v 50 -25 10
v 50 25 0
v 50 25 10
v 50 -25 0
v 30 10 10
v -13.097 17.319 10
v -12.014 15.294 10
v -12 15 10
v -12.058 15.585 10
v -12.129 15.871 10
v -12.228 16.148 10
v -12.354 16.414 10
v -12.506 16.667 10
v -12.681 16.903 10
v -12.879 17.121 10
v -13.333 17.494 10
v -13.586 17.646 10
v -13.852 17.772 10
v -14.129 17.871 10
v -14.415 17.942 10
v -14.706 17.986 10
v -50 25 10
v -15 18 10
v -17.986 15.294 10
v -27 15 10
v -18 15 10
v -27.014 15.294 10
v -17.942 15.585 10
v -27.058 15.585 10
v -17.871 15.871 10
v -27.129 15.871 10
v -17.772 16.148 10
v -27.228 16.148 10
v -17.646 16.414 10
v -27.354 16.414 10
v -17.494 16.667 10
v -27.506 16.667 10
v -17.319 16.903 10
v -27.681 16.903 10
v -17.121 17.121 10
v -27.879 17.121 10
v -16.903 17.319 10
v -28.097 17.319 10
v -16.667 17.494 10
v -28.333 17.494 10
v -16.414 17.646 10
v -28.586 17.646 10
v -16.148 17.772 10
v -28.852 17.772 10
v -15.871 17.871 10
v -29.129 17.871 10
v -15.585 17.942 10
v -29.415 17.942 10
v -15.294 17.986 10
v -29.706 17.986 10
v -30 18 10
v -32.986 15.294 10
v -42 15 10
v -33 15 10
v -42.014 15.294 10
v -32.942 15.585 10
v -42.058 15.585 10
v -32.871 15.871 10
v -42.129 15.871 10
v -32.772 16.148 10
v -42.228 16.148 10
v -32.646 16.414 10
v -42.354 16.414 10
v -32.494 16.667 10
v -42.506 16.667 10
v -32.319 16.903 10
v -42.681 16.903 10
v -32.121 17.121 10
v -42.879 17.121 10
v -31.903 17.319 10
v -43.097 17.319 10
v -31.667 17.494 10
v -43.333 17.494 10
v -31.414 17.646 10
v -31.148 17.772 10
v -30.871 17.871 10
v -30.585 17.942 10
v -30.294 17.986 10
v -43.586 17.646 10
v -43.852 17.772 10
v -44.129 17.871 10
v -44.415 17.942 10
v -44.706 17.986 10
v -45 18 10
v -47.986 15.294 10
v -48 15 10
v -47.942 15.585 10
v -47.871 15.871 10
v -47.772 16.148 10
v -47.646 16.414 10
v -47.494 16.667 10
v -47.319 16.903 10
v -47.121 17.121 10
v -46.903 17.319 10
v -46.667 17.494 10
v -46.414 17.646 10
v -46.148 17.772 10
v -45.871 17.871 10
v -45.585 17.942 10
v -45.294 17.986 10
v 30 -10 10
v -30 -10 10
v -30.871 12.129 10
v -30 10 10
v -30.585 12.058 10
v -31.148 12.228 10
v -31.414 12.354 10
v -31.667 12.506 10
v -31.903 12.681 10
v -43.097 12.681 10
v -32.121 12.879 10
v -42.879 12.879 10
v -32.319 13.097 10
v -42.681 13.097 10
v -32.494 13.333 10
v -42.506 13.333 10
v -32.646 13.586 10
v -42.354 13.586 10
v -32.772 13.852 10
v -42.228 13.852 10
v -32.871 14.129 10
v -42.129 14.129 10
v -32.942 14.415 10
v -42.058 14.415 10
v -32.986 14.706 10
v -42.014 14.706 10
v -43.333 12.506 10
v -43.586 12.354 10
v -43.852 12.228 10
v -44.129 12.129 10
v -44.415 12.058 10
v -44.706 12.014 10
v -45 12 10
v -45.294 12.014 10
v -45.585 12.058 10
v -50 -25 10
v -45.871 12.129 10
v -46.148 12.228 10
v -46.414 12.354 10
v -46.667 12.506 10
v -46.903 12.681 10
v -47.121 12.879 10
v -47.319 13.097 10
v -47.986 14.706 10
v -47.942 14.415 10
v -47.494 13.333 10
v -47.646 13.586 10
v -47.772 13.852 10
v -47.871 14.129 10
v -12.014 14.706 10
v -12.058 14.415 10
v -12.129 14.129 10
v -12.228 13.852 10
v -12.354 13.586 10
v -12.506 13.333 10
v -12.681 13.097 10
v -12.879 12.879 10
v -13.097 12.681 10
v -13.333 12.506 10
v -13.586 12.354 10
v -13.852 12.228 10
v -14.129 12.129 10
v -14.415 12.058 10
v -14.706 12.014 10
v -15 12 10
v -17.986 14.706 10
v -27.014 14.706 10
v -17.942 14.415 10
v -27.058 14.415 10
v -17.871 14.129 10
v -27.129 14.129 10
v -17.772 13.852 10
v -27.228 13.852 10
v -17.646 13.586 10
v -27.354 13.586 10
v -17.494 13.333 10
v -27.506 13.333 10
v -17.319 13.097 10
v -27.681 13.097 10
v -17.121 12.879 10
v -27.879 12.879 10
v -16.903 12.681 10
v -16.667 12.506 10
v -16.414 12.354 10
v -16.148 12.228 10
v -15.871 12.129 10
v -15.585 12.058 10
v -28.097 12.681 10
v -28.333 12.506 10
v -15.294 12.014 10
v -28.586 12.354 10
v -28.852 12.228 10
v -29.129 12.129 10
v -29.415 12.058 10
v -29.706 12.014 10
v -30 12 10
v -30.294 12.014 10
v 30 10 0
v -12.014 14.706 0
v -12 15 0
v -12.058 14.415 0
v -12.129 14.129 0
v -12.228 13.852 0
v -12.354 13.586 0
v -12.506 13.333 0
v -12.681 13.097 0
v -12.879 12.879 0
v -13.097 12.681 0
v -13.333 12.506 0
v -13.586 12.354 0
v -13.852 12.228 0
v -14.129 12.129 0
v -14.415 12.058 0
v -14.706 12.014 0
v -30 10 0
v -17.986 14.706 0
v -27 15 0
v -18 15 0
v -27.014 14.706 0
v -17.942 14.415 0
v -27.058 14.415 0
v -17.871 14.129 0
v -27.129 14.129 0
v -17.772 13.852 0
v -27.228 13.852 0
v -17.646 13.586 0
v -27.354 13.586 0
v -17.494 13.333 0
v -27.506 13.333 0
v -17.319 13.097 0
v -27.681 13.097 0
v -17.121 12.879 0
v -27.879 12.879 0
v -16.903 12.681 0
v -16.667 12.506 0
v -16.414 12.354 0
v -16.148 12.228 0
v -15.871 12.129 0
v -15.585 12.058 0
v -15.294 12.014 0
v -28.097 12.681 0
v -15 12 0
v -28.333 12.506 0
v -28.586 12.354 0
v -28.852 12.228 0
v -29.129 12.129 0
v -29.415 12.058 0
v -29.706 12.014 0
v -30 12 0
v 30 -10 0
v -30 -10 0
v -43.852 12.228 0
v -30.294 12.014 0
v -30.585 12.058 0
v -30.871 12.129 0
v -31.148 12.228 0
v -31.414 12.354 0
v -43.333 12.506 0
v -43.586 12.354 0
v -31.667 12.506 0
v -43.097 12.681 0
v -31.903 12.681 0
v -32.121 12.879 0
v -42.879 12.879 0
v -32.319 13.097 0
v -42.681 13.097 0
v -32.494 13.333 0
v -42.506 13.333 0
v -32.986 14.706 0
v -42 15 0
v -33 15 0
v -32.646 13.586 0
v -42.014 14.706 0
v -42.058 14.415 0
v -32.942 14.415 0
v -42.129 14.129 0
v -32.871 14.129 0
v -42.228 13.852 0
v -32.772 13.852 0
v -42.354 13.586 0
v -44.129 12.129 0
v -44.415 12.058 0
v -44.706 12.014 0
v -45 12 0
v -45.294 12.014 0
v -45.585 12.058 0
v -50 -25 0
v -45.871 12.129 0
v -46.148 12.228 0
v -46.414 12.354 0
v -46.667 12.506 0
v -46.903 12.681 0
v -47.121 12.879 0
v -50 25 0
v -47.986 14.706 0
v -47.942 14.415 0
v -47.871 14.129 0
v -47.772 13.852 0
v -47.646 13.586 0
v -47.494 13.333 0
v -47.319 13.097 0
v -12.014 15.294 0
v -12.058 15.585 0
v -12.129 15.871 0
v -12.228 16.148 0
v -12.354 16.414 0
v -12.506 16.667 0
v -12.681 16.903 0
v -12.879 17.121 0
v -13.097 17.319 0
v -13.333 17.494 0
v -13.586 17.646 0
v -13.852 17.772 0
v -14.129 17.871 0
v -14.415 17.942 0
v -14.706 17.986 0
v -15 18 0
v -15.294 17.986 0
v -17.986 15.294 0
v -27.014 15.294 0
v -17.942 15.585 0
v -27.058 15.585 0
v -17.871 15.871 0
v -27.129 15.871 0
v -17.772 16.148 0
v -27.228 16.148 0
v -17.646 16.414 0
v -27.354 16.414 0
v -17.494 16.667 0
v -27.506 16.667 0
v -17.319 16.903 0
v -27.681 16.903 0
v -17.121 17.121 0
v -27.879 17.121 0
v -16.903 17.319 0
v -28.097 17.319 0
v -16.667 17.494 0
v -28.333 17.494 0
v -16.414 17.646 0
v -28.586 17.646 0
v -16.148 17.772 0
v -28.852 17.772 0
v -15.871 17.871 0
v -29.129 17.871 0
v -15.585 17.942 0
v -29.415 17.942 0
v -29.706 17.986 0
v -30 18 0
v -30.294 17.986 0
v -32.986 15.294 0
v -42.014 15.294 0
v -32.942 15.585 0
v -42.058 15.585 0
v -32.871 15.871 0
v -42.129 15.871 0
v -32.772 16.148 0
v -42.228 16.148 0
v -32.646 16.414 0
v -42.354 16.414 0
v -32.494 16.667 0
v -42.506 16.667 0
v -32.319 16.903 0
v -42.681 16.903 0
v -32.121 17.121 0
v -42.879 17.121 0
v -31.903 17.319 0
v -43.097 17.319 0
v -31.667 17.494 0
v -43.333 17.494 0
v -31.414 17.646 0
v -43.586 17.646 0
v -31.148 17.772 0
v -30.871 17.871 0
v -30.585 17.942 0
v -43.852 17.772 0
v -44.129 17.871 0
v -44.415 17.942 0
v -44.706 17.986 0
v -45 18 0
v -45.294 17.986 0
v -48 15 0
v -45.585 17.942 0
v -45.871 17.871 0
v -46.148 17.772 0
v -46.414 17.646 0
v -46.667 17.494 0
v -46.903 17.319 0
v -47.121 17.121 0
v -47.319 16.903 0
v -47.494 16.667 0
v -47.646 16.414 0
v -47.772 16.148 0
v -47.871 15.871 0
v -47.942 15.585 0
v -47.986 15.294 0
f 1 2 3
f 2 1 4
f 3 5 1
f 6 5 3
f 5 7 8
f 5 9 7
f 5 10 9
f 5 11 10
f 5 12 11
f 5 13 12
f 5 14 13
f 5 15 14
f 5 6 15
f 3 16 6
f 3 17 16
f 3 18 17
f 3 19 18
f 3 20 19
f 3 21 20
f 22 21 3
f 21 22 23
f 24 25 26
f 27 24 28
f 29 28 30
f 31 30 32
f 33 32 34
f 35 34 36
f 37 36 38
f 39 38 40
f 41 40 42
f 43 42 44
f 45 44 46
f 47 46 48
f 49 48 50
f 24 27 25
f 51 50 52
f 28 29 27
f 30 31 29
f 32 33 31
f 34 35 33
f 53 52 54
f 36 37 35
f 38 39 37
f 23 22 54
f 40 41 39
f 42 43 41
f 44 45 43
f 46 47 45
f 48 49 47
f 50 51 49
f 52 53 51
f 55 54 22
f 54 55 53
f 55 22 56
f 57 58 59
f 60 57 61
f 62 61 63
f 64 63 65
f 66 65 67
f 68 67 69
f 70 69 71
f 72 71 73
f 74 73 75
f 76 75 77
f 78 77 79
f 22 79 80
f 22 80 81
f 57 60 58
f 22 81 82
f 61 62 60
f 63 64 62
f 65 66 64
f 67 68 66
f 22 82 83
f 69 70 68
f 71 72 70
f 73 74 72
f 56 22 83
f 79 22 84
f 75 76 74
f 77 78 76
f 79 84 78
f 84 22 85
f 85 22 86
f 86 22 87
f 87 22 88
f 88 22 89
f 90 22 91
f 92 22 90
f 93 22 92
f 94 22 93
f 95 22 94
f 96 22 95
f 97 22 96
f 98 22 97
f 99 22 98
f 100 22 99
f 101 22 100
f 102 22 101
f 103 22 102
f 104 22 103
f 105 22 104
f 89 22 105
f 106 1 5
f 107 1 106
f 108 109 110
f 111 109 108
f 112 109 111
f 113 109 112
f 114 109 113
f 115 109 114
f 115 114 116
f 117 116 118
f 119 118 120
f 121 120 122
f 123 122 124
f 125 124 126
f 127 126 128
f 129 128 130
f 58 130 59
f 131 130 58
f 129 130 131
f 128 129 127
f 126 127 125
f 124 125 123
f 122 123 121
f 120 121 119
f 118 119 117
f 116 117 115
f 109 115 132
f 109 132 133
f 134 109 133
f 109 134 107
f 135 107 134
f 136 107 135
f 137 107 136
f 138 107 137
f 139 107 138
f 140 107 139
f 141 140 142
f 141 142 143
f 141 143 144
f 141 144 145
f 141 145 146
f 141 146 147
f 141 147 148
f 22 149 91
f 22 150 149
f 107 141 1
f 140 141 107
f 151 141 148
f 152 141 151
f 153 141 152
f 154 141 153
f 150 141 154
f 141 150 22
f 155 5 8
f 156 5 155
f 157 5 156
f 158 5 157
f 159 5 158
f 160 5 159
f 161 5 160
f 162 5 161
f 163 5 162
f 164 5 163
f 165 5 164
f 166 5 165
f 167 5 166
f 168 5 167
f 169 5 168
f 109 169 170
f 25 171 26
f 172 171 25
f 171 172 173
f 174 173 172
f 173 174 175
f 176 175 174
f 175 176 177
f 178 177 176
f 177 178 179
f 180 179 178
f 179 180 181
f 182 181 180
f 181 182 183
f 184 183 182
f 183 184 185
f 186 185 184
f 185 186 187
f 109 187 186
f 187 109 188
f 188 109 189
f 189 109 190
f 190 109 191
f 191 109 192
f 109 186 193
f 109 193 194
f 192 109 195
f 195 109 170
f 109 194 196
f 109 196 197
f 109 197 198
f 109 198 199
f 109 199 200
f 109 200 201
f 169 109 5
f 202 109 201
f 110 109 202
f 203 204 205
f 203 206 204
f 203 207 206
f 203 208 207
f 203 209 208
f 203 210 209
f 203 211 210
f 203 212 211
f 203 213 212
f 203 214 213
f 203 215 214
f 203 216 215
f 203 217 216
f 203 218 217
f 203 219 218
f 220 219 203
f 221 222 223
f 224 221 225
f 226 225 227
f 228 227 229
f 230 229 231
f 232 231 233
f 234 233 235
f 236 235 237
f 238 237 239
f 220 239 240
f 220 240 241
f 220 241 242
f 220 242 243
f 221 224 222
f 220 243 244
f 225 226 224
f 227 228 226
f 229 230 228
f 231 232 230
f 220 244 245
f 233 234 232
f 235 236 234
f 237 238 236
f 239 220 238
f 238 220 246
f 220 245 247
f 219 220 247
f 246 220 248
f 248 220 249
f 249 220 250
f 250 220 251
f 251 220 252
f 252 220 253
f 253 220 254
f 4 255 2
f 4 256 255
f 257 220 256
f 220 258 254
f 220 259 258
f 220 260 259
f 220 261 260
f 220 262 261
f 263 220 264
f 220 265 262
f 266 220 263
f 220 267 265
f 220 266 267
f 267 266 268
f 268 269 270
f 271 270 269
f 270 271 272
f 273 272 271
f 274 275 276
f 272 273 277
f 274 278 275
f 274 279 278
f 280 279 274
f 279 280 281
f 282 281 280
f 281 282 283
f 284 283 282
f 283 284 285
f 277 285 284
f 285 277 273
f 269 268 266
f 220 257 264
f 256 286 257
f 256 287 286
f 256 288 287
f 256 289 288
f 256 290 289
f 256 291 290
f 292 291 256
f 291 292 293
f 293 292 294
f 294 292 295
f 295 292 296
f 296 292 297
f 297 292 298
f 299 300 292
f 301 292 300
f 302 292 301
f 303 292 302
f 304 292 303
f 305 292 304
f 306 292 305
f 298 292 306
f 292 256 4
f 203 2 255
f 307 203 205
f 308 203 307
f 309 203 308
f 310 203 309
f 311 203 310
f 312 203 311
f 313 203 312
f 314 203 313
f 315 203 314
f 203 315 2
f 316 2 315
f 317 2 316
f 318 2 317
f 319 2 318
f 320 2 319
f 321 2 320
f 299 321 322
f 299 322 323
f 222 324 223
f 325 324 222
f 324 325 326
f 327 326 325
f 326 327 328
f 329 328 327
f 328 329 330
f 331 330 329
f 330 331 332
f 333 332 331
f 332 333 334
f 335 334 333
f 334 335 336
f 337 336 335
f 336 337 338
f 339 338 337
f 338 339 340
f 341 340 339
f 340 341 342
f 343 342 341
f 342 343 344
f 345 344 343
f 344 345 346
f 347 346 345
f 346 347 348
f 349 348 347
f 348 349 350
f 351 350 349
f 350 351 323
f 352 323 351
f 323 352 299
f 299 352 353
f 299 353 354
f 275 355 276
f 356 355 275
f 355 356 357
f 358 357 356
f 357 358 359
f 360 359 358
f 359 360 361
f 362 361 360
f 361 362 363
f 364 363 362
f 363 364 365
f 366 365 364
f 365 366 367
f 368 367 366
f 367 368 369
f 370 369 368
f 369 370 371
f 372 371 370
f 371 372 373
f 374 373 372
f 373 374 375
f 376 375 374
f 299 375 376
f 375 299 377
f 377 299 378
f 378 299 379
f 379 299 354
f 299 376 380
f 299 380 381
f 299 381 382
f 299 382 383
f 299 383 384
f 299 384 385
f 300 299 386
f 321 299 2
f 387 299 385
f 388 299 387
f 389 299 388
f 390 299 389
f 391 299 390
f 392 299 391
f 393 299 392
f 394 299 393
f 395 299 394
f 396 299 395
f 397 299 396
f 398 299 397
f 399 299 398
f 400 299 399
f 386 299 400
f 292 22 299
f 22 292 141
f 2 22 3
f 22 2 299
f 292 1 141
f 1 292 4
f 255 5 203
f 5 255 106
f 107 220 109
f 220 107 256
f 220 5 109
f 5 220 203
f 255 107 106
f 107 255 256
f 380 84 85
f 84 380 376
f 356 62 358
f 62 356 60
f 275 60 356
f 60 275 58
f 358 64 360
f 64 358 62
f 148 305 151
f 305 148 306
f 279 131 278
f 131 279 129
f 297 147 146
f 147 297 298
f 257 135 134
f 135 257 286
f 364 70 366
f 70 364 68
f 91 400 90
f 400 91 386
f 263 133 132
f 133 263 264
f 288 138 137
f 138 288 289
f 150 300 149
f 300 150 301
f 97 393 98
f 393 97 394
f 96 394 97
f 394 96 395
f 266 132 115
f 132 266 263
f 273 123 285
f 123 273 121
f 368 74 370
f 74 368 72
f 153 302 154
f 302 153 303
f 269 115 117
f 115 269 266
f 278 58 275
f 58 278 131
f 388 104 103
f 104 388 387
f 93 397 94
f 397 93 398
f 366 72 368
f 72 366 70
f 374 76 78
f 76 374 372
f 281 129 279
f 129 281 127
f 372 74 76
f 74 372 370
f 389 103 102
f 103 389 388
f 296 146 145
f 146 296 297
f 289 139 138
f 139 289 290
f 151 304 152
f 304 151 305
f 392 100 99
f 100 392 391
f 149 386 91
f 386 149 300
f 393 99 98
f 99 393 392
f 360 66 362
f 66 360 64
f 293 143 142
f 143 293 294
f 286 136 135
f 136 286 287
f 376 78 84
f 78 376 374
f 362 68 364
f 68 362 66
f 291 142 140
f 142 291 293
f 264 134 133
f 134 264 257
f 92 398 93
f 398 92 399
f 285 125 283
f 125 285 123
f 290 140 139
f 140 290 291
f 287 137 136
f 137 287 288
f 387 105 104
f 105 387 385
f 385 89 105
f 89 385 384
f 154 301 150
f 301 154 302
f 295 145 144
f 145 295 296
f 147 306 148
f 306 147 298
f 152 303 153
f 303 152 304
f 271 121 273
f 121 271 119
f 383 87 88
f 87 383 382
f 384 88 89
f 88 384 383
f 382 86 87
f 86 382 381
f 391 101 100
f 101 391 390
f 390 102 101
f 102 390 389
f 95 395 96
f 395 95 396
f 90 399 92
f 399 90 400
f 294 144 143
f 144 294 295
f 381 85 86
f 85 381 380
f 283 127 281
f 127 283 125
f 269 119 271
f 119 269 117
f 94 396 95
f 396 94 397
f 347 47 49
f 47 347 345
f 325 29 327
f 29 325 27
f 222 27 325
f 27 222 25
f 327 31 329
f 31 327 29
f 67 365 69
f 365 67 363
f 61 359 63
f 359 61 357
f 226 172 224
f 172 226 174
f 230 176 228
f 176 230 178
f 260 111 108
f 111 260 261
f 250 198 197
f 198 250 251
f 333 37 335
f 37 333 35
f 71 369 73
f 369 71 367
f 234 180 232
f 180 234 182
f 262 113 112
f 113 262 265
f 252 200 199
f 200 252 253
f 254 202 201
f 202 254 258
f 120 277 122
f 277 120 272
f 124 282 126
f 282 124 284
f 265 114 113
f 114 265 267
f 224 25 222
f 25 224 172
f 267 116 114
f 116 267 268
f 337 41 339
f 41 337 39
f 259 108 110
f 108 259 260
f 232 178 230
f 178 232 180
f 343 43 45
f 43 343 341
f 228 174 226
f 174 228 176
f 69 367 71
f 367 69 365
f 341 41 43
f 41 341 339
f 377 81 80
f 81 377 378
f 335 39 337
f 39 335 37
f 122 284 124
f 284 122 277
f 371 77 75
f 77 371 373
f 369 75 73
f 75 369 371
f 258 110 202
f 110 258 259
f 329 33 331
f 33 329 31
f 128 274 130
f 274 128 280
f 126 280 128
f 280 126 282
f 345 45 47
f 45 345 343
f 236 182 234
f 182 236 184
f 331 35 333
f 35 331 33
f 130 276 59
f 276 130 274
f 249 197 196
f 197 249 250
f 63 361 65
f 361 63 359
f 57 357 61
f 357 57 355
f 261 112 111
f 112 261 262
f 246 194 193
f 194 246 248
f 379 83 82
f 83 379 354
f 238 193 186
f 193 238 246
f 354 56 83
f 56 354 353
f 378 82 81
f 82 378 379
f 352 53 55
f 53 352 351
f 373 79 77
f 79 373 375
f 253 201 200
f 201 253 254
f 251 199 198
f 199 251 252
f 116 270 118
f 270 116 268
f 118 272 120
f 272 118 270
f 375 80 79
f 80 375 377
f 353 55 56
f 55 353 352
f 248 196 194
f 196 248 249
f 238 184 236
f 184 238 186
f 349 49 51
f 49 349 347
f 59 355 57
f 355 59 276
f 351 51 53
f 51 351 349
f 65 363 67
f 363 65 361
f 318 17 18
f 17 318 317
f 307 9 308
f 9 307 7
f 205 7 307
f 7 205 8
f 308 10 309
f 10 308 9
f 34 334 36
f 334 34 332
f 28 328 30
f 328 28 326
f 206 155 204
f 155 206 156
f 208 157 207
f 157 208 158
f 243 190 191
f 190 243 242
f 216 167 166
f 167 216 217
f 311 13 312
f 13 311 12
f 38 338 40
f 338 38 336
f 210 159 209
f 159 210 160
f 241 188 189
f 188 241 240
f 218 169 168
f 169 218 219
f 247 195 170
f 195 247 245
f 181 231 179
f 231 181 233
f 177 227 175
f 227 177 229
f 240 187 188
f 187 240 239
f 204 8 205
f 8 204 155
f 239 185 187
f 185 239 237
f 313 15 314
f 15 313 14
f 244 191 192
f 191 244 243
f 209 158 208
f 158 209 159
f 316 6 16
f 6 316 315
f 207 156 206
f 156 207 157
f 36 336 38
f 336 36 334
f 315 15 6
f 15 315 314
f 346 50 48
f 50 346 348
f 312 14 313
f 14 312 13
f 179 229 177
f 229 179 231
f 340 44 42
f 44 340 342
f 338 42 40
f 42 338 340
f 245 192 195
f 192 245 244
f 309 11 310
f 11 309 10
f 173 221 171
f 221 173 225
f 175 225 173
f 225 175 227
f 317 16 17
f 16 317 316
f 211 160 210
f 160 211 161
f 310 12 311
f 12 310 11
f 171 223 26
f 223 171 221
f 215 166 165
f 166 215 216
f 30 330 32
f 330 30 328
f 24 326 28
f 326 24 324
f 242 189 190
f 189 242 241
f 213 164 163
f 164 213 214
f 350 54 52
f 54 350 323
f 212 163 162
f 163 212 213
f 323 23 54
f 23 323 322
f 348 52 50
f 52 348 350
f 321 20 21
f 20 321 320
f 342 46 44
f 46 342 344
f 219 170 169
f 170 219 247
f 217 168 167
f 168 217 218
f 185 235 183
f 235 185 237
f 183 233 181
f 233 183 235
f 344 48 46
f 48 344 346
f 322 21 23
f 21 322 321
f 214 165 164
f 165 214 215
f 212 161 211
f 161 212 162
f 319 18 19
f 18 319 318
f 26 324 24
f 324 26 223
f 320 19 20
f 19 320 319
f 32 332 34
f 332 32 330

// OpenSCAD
module panel_meter() {
    difference() {
        // Main body of the panel meter
        translate([-50, -25, 0])
            cube([100, 50, 10]);

        // Display cutout
        translate([-30, -10, -1])
            cube([60, 20, 11]);

        // Button cutouts
        translate([-45, 15, -1])
            cylinder(h=11, r=3, $fn=64);
        translate([-30, 15, -1])
            cylinder(h=11, r=3, $fn=64);
        translate([-15, 15, -1])
            cylinder(h=11, r=3, $fn=64);
    }
}

panel_meter();
